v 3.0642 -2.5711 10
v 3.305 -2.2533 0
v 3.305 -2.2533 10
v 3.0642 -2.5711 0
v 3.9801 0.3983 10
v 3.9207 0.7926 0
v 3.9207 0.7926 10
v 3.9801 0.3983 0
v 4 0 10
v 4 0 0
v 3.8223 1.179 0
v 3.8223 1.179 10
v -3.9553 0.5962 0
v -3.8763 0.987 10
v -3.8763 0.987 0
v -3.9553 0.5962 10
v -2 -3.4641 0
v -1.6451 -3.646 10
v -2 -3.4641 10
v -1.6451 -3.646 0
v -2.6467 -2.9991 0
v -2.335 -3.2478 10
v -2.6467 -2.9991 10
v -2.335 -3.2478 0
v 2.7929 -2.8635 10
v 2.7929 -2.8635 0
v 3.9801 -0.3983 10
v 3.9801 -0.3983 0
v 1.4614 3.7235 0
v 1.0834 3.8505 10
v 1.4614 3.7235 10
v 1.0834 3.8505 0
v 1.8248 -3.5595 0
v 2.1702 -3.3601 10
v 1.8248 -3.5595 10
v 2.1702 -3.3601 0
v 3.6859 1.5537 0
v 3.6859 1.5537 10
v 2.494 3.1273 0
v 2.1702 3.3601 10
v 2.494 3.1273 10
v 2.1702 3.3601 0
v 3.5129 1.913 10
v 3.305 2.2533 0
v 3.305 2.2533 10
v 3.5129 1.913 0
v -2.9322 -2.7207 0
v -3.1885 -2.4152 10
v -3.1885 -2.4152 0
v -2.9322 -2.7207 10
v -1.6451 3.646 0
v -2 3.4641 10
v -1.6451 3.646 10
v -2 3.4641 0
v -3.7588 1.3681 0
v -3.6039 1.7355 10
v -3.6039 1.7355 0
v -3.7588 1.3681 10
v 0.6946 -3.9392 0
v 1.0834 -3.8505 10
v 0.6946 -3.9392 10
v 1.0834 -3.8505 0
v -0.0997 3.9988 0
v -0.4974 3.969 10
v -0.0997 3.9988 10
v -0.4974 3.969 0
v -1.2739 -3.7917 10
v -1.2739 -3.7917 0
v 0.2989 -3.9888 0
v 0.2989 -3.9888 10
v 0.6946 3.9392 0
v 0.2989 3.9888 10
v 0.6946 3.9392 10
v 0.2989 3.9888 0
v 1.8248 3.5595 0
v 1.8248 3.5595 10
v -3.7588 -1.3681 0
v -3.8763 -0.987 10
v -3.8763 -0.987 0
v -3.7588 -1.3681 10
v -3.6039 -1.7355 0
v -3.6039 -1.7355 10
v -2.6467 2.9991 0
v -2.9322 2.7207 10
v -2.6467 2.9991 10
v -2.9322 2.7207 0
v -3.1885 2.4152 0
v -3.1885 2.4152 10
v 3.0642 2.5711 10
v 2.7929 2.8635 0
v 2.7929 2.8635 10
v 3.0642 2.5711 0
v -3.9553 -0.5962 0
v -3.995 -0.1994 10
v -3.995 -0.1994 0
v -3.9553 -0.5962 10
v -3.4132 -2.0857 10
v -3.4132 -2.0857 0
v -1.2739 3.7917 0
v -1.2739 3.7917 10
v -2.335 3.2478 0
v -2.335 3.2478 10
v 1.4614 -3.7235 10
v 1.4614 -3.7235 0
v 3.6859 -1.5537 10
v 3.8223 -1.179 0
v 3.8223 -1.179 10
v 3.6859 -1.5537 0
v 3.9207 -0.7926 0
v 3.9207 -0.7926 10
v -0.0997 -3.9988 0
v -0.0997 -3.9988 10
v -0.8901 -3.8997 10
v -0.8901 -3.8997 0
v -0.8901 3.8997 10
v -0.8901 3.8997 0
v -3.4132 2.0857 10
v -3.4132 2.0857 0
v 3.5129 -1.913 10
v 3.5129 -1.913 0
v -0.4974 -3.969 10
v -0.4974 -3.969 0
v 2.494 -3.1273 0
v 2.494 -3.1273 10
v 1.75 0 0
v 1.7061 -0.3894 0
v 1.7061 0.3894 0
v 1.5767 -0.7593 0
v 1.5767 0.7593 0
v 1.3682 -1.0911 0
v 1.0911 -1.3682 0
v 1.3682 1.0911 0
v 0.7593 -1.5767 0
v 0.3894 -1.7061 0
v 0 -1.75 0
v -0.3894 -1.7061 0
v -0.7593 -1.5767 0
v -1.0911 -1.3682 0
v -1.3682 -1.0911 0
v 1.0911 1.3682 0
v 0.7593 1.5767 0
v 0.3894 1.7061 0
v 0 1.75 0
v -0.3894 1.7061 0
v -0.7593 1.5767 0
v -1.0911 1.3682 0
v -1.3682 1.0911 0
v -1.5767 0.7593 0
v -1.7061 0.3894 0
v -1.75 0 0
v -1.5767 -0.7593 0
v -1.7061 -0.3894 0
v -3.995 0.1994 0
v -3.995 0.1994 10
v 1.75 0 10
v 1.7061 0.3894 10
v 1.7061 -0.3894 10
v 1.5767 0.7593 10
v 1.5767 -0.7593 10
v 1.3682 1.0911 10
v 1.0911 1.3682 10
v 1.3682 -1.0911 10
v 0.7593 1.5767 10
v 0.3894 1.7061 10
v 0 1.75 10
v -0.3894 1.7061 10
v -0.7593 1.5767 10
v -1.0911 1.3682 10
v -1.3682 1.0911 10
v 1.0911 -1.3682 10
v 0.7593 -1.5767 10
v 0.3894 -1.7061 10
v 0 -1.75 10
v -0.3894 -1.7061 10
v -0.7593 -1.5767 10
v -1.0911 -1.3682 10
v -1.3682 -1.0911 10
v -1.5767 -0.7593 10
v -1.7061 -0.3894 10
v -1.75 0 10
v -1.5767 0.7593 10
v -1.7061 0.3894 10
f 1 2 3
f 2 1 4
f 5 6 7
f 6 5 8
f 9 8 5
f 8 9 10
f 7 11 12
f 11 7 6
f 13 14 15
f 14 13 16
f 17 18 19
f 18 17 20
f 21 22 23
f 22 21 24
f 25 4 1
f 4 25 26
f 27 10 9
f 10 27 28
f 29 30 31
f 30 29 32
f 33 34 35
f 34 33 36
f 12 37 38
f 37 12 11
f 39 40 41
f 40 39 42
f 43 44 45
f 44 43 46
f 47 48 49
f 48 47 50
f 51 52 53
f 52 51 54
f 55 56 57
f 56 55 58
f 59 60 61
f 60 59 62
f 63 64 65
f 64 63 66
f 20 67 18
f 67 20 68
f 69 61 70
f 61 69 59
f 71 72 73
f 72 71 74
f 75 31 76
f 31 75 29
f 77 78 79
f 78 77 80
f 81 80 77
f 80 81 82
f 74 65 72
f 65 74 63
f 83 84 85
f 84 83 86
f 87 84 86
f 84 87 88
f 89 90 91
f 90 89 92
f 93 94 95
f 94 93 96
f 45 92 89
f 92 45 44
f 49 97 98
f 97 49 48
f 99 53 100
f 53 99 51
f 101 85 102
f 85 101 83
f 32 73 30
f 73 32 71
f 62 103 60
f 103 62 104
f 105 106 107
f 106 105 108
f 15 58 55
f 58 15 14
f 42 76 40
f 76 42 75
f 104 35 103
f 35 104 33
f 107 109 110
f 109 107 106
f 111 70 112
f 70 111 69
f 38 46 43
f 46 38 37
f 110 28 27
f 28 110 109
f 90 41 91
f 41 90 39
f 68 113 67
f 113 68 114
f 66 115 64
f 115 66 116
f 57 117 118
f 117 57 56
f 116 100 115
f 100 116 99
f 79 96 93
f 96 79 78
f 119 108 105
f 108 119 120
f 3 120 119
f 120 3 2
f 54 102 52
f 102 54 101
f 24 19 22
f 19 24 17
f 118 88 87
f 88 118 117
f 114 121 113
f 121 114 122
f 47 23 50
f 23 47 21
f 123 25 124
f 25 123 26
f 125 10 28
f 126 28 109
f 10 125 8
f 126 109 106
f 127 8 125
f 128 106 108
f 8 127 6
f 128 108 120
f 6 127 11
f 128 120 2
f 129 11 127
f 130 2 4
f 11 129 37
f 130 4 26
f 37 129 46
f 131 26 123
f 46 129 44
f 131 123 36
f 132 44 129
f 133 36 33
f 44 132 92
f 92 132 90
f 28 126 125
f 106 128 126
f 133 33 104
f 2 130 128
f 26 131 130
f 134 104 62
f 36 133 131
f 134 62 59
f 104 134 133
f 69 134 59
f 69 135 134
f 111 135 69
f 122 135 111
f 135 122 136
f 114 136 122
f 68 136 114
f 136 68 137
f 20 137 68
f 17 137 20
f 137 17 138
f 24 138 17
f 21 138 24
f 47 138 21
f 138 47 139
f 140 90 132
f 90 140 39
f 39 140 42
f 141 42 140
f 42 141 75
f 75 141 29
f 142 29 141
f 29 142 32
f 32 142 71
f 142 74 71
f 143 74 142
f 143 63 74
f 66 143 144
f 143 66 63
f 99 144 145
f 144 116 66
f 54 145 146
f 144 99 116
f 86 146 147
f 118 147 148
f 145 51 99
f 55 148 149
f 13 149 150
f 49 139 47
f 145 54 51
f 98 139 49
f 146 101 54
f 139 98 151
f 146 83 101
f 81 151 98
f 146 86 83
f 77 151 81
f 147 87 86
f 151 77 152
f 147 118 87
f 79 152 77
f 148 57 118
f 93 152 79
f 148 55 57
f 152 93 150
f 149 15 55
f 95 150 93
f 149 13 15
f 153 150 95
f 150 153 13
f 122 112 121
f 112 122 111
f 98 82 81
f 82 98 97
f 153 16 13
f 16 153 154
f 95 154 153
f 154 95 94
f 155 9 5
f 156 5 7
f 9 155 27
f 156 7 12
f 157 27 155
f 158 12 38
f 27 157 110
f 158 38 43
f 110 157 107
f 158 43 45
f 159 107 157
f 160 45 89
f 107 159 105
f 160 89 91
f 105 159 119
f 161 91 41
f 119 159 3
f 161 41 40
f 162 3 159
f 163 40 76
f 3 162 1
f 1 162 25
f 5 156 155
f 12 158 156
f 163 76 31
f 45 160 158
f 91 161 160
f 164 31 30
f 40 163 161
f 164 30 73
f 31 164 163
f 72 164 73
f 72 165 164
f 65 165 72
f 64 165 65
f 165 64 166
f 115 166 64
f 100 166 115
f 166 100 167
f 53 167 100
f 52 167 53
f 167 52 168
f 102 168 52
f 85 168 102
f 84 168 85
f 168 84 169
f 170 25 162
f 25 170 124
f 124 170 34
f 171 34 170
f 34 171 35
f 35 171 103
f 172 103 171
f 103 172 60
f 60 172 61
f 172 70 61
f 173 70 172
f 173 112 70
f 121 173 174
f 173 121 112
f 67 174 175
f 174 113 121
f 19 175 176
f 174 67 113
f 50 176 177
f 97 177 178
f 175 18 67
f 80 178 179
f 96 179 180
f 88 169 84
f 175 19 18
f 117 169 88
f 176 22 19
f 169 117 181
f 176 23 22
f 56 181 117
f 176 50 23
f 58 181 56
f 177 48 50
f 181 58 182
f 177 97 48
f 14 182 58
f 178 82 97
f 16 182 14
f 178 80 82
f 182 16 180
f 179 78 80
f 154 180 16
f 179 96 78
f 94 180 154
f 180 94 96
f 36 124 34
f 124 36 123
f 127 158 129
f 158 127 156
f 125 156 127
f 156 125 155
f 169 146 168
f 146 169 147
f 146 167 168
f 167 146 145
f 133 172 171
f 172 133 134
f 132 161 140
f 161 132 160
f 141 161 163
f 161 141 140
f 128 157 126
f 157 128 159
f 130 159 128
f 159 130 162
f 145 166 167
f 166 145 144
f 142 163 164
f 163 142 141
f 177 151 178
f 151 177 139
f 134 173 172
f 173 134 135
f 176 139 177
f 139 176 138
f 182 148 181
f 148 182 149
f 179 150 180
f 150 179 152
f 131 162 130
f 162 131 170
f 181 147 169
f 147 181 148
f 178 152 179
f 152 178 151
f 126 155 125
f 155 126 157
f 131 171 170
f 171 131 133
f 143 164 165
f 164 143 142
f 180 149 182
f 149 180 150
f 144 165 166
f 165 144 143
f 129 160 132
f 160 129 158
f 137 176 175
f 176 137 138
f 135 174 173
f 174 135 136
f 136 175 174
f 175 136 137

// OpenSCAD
// file: m3-spacer.params.scad
/*
Everything you SET for the M3 spacer. Render m3-spacer.scad, not this file.

Lesson 6 - the last one. A spacer is a trivial shape on purpose: the point is the
structure, which is the one every model in this repository uses. Settings live
here, with the reason for each value next to it. The geometry, and the rules that
check these settings, live in the model file.
*/

/* [Size] */
length = 10.0;    /* Height of the spacer. Must be a whole number of layers - the model asserts it. */
hole_d = 3.2;     /* NOMINAL clearance for an M3 screw, before compensation. 3.2 is a close fit; measure what your screws need. */
wall   = 2.25;    /* Material around the hole, in mm. A screw clamps this part, so docs/fdm-design-rules.md §1 asks for 2.25 - five beads (extrusion widths) across the wall. Try 1.8 to see a WARNING, and 1.1 to see the build refuse. */

/* [Print reality - cross-checked by scad-tools/scripts/scad-check.sh against the profile used] */
fdm_layer_h     = 0.2;     /* Must match the print profile. length has to be a whole multiple of this. */
fdm_extrusion_w = 0.45;    /* 0.4 nozzle. Walls are designed in multiples of this - fdm-design-rules §1. */
fdm_hole_comp   = 0.15;    /* Added to every hole's RADIUS, because holes print undersize - fdm-design-rules §2. That figure is for a 0.4 nozzle; re-measure for any other. scad-check.sh does NOT cross-check this one: no slicer setting says what it should be. */
// main file
/*
Lesson 6 - a real part, written the way this repository writes them.

Check it end to end from the repository root:

    sh scad-tools/scripts/scad-check.sh docs/openscad-basics/06-a-real-part/m3-spacer.scad

That renders it, runs its asserts, confirms the mesh is one manifold part, slices
it, and compares the fdm_* values against the profile it was actually sliced with.

Two kinds of check, and the difference between them is the point:
  assert()               the settings describe something that cannot print
                         properly. The build STOPS, and scad-check.sh reports BLOCKED.
  echo("WARNING: ...")   it builds and prints, but something is compromised. The
                         build continues, and scad-check.sh exits 2 so you decide.

BEADS, NOT PERIMETERS. This model counts BEADS: extrusion widths across the wall.
scad-check.sh also prints the profile's `perimeters` setting, which counts loops
per SURFACE - and a tube has two surfaces, the outside and the hole. So "5 beads"
here and "perimeters 2" in the slicer line are not in conflict.
fdm-design-rules §1 uses "perimeters" in the bead sense.
*/
include <m3-spacer.params.scad>

// Derived values - computed from the settings, never set by hand.
hole_model_d = hole_d + 2 * fdm_hole_comp;   // what is actually modelled
outer_d      = hole_model_d + 2 * wall;
beads        = wall / fdm_extrusion_w;
layers       = length / fdm_layer_h;

eps = 0.01;    // how far a cutter overshoots a face (lesson 2)
$fa = 2;       // curve resolution for the whole part (lesson 1)
$fs = 0.4;

// The rules. Each message quotes the numbers it protects, so a failure tells
// you what to change - not merely that something is wrong.
assert(abs(beads - round(beads)) < 1e-6,
       str("wall (", wall, ") must be a whole number of extrusion widths (",
           fdm_extrusion_w, "); it is ", beads,
           " - fdm-design-rules §1: an in-between wall prints with a void in it"));

assert(beads >= 3,
       str("wall (", wall, ") is under three beads (", 3 * fdm_extrusion_w,
           " mm), the minimum for anything that takes force - fdm-design-rules §1"));

assert(hole_d >= 2,
       str("hole_d (", hole_d, ") is under 2 mm. Holes that small distort or close up;",
           " print a pilot and drill it - fdm-design-rules §2"));

assert(abs(layers - round(layers)) < 1e-6,
       str("length (", length, ") must be a whole number of ", fdm_layer_h,
           " mm layers; it is ", layers));

// A judgement call, not an impossibility: a thinner wall still prints.
if (round(beads) < 5)
    echo(str("WARNING: the wall is ", round(beads), " beads. A screw clamps",
             " this part, and fdm-design-rules §1 asks for 5 (", 5 * fdm_extrusion_w, " mm)"));

// Facts worth seeing every time it renders.
echo(str("M3 spacer: ", length, " mm long, ", outer_d, " mm across, ",
         round(beads), " beads of wall, ", round(layers), " layers"));
echo(str("hole modelled at ", hole_model_d, " mm for a nominal ", hole_d,
         " mm - it prints undersize by roughly the difference"));

// The part itself is two lines. Everything above exists so that these two lines
// can only ever be given numbers that print.
difference() {
    cylinder(h = length, d = outer_d);
    translate([0, 0, -eps])
        cylinder(h = length + 2 * eps, d = hole_model_d);
}

// TRY
//  1. Set wall = 1.8 in the params file and run scad-check.sh. Read the WARNING.
//  2. Set wall = 1.1. Read the assert message, then find the rule it quotes.
//  3. Set length = 10.1. Why does that fail when 10.2 does not?
//  4. Add a hexagonal outside, so a spanner can hold it: cylinder(..., $fn = 6).
//     A hexagon's "diameter" is corner to corner, so work out what d gives 7 mm
//     across the flats - and add an assert that the wall still holds at a flat.
